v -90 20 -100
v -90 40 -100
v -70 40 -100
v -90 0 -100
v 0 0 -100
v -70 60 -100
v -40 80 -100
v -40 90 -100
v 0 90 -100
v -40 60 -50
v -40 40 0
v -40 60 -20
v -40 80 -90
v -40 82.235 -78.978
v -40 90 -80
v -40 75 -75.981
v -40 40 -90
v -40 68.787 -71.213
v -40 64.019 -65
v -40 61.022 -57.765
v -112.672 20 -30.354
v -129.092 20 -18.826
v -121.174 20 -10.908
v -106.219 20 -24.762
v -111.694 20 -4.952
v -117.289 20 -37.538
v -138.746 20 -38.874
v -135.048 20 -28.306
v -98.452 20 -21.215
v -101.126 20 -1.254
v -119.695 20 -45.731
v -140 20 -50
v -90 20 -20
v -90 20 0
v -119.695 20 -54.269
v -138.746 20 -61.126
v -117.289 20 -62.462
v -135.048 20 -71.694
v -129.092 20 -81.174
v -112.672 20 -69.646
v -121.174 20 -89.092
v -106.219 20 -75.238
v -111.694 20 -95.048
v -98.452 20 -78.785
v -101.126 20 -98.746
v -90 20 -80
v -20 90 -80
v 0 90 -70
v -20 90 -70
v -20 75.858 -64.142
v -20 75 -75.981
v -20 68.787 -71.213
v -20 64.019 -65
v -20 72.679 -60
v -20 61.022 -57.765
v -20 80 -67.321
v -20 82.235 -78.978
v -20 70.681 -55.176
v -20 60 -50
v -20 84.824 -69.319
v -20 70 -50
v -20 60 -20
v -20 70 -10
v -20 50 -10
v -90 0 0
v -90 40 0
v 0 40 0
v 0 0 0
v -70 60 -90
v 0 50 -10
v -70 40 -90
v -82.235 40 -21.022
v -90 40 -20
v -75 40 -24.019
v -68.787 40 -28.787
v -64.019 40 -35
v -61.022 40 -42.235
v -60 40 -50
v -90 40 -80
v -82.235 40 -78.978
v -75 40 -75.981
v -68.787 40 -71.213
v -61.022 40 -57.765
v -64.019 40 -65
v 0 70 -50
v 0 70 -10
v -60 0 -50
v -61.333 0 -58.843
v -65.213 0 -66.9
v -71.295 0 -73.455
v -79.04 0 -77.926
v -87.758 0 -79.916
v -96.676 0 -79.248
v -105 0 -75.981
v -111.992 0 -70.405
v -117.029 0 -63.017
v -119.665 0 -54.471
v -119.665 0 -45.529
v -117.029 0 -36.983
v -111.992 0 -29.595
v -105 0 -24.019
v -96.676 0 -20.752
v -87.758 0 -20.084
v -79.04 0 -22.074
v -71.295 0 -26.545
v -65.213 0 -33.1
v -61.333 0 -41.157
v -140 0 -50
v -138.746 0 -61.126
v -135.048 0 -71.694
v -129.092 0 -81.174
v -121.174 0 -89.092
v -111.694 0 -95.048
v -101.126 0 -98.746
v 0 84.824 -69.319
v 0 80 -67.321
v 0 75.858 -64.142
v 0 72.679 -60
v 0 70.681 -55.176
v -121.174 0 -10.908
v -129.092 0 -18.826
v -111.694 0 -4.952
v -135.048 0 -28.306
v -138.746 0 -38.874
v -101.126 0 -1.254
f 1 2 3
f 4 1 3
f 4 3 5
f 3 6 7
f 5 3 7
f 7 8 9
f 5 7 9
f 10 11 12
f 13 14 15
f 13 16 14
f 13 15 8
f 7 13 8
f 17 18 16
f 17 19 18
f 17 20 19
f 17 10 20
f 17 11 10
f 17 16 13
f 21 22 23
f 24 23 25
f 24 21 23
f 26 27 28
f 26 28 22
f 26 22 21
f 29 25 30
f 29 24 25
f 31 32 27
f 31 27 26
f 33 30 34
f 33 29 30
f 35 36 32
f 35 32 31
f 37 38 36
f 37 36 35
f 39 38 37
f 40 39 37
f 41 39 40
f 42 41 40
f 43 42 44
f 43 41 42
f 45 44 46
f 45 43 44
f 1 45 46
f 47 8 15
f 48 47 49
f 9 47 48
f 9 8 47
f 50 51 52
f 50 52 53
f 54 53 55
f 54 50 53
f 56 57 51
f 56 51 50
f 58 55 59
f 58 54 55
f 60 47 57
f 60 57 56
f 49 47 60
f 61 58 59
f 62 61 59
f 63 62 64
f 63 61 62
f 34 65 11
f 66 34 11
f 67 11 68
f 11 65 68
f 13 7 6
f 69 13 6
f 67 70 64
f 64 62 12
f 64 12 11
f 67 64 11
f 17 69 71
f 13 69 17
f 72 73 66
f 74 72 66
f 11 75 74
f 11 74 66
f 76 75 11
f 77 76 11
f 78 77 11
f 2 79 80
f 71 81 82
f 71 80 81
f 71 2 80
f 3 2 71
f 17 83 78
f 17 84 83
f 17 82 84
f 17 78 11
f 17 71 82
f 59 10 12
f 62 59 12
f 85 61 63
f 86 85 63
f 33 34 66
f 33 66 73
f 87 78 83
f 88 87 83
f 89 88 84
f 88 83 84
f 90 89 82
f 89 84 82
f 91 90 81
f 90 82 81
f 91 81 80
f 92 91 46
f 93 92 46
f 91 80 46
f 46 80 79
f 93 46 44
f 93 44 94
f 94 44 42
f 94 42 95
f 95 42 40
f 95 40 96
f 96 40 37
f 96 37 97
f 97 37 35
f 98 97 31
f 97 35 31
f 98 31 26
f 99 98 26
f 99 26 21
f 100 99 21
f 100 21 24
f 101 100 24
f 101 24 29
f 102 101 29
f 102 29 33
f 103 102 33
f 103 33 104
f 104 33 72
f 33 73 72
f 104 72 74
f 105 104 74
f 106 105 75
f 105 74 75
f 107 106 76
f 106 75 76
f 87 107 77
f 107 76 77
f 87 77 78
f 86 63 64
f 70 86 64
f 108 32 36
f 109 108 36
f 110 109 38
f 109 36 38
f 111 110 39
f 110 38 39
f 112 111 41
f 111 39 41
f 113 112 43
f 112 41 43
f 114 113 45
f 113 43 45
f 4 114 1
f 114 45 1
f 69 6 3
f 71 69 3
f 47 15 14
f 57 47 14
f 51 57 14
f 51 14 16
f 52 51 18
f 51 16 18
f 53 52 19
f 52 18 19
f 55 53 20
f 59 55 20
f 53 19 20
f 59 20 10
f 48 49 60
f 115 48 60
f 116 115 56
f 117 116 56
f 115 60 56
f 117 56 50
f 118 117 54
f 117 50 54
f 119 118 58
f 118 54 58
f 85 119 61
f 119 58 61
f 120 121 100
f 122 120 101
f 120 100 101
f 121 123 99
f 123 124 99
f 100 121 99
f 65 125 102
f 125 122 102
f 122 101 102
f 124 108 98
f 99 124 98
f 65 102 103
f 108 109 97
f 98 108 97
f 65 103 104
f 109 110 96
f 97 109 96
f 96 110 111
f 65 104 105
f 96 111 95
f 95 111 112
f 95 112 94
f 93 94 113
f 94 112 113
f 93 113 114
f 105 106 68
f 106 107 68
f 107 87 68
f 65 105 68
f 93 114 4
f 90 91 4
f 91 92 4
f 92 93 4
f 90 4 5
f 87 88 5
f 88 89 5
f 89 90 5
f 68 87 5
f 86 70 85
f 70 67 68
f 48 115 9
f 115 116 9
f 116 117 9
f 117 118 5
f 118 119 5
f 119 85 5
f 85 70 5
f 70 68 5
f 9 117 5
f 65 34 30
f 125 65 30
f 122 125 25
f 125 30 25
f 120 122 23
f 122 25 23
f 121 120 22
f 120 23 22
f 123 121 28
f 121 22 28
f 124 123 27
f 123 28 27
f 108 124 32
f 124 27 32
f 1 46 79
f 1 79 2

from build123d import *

# Parameters (mm, degrees)
SKETCH2_W           = 140
SKETCH2_H           = 100
BOSS_EXTRUDE2_DEPTH = 90
CUT_EXTRUDE1_DEPTH  = 90
SKETCH4_R           = 30
CUT_EXTRUDE2_DEPTH  = 90
SKETCH5_W           = 50
SKETCH5_H           = 100
CUT_EXTRUDE3_DEPTH  = 90
SKETCH6_W           = 50
SKETCH6_H           = 100
CUT_EXTRUDE4_DEPTH  = 90
CUT_EXTRUDE5_DEPTH  = 20
CUT_EXTRUDE6_DEPTH  = 20
CUT_EXTRUDE7_DEPTH  = 20
BOSS_EXTRUDE3_DEPTH = 10


with BuildPart() as part:
    # Sketch2 → Boss-Extrude2 (new body)
    with BuildSketch(Plane(origin=(0, 0, 0), x_dir=(1, 0, 0), z_dir=(0, 1, 0))):
        with Locations((-70, 50)):
            Rectangle(SKETCH2_W, SKETCH2_H)
    extrude(amount=BOSS_EXTRUDE2_DEPTH)

    # Sketch3 → Cut-Extrude1 (cut)
    with BuildSketch(Plane(origin=(0, 90, 0), x_dir=(1, 0, 0), z_dir=(0, 1, 0))):
        with BuildLine():
            ThreePointArc((-140, 50), (-125.355339059, 85.355339059), (-90, 100))
            Line((-90, 100), (-140, 100))
            Line((-140, 100), (-140, 50))
        make_face()
        with BuildLine():
            ThreePointArc((-90, 0), (-125.355339059, 14.644660941), (-140, 50))
            Line((-140, 50), (-140, 0))
            Line((-140, 0), (-90, 0))
        make_face()
    extrude(amount=-CUT_EXTRUDE1_DEPTH, mode=Mode.SUBTRACT)

    # Sketch4 → Cut-Extrude2 (cut)
    with BuildSketch(Plane(origin=(0, 90, 0), x_dir=(1, 0, 0), z_dir=(0, 1, 0))):
        with Locations((-90, 50)):
            Circle(SKETCH4_R)
    extrude(amount=-CUT_EXTRUDE2_DEPTH, mode=Mode.SUBTRACT)

    # Sketch5 → Cut-Extrude3 (cut)
    with BuildSketch(Plane(origin=(0, 20, 0), x_dir=(1, 0, 0), z_dir=(0, 1, 0))):
        with Locations((-115, 50)):
            Rectangle(SKETCH5_W, SKETCH5_H)
    extrude(amount=CUT_EXTRUDE3_DEPTH, mode=Mode.SUBTRACT)

    # Sketch6 → Cut-Extrude4 (cut)
    with BuildSketch(Plane(origin=(0, 40, 0), x_dir=(1, 0, 0), z_dir=(0, 1, 0))):
        with Locations((-65, 50)):
            Rectangle(SKETCH6_W, SKETCH6_H)
    extrude(amount=CUT_EXTRUDE4_DEPTH, mode=Mode.SUBTRACT)

    # Sketch7 → Cut-Extrude5 (cut)
    with BuildSketch(Plane.ZY.offset(40)):
        with BuildLine():
            Line((-50, 60), (0, 60))
            Line((0, 60), (0, 90))
            Line((0, 90), (-80, 90))
            ThreePointArc((-80, 90), (-71.213203436, 68.786796564), (-50, 60))
        make_face()
    extrude(amount=-CUT_EXTRUDE5_DEPTH, mode=Mode.SUBTRACT)

    # Sketch8 → Cut-Extrude6 (cut)
    with BuildSketch(Plane.ZY.offset(40)):
        Polygon((0, 40), (-20, 60), (0, 60), align=None)
    extrude(amount=-CUT_EXTRUDE6_DEPTH, mode=Mode.SUBTRACT)

    # Sketch9 → Cut-Extrude7 (cut)
    with BuildSketch(Plane.ZY.offset(20)):
        with BuildLine():
            Line((-50, 70), (-10, 70))
            Line((-10, 70), (-10, 50))
            Line((-10, 50), (0, 40))
            Line((0, 40), (0, 90))
            Line((0, 90), (-70, 90))
            ThreePointArc((-70, 90), (-64.142135624, 75.857864376), (-50, 70))
        make_face()
    extrude(amount=-CUT_EXTRUDE7_DEPTH, mode=Mode.SUBTRACT)

    # Sketch10 → Boss-Extrude3 (add)
    with BuildSketch(Plane(origin=(0, 0, -100), x_dir=(-1, 0, 0), z_dir=(0, 0, -1))):
        Polygon((40, 80), (70, 60), (70, 40), (40, 40), align=None)
    extrude(amount=-BOSS_EXTRUDE3_DEPTH)


solid = part.part
